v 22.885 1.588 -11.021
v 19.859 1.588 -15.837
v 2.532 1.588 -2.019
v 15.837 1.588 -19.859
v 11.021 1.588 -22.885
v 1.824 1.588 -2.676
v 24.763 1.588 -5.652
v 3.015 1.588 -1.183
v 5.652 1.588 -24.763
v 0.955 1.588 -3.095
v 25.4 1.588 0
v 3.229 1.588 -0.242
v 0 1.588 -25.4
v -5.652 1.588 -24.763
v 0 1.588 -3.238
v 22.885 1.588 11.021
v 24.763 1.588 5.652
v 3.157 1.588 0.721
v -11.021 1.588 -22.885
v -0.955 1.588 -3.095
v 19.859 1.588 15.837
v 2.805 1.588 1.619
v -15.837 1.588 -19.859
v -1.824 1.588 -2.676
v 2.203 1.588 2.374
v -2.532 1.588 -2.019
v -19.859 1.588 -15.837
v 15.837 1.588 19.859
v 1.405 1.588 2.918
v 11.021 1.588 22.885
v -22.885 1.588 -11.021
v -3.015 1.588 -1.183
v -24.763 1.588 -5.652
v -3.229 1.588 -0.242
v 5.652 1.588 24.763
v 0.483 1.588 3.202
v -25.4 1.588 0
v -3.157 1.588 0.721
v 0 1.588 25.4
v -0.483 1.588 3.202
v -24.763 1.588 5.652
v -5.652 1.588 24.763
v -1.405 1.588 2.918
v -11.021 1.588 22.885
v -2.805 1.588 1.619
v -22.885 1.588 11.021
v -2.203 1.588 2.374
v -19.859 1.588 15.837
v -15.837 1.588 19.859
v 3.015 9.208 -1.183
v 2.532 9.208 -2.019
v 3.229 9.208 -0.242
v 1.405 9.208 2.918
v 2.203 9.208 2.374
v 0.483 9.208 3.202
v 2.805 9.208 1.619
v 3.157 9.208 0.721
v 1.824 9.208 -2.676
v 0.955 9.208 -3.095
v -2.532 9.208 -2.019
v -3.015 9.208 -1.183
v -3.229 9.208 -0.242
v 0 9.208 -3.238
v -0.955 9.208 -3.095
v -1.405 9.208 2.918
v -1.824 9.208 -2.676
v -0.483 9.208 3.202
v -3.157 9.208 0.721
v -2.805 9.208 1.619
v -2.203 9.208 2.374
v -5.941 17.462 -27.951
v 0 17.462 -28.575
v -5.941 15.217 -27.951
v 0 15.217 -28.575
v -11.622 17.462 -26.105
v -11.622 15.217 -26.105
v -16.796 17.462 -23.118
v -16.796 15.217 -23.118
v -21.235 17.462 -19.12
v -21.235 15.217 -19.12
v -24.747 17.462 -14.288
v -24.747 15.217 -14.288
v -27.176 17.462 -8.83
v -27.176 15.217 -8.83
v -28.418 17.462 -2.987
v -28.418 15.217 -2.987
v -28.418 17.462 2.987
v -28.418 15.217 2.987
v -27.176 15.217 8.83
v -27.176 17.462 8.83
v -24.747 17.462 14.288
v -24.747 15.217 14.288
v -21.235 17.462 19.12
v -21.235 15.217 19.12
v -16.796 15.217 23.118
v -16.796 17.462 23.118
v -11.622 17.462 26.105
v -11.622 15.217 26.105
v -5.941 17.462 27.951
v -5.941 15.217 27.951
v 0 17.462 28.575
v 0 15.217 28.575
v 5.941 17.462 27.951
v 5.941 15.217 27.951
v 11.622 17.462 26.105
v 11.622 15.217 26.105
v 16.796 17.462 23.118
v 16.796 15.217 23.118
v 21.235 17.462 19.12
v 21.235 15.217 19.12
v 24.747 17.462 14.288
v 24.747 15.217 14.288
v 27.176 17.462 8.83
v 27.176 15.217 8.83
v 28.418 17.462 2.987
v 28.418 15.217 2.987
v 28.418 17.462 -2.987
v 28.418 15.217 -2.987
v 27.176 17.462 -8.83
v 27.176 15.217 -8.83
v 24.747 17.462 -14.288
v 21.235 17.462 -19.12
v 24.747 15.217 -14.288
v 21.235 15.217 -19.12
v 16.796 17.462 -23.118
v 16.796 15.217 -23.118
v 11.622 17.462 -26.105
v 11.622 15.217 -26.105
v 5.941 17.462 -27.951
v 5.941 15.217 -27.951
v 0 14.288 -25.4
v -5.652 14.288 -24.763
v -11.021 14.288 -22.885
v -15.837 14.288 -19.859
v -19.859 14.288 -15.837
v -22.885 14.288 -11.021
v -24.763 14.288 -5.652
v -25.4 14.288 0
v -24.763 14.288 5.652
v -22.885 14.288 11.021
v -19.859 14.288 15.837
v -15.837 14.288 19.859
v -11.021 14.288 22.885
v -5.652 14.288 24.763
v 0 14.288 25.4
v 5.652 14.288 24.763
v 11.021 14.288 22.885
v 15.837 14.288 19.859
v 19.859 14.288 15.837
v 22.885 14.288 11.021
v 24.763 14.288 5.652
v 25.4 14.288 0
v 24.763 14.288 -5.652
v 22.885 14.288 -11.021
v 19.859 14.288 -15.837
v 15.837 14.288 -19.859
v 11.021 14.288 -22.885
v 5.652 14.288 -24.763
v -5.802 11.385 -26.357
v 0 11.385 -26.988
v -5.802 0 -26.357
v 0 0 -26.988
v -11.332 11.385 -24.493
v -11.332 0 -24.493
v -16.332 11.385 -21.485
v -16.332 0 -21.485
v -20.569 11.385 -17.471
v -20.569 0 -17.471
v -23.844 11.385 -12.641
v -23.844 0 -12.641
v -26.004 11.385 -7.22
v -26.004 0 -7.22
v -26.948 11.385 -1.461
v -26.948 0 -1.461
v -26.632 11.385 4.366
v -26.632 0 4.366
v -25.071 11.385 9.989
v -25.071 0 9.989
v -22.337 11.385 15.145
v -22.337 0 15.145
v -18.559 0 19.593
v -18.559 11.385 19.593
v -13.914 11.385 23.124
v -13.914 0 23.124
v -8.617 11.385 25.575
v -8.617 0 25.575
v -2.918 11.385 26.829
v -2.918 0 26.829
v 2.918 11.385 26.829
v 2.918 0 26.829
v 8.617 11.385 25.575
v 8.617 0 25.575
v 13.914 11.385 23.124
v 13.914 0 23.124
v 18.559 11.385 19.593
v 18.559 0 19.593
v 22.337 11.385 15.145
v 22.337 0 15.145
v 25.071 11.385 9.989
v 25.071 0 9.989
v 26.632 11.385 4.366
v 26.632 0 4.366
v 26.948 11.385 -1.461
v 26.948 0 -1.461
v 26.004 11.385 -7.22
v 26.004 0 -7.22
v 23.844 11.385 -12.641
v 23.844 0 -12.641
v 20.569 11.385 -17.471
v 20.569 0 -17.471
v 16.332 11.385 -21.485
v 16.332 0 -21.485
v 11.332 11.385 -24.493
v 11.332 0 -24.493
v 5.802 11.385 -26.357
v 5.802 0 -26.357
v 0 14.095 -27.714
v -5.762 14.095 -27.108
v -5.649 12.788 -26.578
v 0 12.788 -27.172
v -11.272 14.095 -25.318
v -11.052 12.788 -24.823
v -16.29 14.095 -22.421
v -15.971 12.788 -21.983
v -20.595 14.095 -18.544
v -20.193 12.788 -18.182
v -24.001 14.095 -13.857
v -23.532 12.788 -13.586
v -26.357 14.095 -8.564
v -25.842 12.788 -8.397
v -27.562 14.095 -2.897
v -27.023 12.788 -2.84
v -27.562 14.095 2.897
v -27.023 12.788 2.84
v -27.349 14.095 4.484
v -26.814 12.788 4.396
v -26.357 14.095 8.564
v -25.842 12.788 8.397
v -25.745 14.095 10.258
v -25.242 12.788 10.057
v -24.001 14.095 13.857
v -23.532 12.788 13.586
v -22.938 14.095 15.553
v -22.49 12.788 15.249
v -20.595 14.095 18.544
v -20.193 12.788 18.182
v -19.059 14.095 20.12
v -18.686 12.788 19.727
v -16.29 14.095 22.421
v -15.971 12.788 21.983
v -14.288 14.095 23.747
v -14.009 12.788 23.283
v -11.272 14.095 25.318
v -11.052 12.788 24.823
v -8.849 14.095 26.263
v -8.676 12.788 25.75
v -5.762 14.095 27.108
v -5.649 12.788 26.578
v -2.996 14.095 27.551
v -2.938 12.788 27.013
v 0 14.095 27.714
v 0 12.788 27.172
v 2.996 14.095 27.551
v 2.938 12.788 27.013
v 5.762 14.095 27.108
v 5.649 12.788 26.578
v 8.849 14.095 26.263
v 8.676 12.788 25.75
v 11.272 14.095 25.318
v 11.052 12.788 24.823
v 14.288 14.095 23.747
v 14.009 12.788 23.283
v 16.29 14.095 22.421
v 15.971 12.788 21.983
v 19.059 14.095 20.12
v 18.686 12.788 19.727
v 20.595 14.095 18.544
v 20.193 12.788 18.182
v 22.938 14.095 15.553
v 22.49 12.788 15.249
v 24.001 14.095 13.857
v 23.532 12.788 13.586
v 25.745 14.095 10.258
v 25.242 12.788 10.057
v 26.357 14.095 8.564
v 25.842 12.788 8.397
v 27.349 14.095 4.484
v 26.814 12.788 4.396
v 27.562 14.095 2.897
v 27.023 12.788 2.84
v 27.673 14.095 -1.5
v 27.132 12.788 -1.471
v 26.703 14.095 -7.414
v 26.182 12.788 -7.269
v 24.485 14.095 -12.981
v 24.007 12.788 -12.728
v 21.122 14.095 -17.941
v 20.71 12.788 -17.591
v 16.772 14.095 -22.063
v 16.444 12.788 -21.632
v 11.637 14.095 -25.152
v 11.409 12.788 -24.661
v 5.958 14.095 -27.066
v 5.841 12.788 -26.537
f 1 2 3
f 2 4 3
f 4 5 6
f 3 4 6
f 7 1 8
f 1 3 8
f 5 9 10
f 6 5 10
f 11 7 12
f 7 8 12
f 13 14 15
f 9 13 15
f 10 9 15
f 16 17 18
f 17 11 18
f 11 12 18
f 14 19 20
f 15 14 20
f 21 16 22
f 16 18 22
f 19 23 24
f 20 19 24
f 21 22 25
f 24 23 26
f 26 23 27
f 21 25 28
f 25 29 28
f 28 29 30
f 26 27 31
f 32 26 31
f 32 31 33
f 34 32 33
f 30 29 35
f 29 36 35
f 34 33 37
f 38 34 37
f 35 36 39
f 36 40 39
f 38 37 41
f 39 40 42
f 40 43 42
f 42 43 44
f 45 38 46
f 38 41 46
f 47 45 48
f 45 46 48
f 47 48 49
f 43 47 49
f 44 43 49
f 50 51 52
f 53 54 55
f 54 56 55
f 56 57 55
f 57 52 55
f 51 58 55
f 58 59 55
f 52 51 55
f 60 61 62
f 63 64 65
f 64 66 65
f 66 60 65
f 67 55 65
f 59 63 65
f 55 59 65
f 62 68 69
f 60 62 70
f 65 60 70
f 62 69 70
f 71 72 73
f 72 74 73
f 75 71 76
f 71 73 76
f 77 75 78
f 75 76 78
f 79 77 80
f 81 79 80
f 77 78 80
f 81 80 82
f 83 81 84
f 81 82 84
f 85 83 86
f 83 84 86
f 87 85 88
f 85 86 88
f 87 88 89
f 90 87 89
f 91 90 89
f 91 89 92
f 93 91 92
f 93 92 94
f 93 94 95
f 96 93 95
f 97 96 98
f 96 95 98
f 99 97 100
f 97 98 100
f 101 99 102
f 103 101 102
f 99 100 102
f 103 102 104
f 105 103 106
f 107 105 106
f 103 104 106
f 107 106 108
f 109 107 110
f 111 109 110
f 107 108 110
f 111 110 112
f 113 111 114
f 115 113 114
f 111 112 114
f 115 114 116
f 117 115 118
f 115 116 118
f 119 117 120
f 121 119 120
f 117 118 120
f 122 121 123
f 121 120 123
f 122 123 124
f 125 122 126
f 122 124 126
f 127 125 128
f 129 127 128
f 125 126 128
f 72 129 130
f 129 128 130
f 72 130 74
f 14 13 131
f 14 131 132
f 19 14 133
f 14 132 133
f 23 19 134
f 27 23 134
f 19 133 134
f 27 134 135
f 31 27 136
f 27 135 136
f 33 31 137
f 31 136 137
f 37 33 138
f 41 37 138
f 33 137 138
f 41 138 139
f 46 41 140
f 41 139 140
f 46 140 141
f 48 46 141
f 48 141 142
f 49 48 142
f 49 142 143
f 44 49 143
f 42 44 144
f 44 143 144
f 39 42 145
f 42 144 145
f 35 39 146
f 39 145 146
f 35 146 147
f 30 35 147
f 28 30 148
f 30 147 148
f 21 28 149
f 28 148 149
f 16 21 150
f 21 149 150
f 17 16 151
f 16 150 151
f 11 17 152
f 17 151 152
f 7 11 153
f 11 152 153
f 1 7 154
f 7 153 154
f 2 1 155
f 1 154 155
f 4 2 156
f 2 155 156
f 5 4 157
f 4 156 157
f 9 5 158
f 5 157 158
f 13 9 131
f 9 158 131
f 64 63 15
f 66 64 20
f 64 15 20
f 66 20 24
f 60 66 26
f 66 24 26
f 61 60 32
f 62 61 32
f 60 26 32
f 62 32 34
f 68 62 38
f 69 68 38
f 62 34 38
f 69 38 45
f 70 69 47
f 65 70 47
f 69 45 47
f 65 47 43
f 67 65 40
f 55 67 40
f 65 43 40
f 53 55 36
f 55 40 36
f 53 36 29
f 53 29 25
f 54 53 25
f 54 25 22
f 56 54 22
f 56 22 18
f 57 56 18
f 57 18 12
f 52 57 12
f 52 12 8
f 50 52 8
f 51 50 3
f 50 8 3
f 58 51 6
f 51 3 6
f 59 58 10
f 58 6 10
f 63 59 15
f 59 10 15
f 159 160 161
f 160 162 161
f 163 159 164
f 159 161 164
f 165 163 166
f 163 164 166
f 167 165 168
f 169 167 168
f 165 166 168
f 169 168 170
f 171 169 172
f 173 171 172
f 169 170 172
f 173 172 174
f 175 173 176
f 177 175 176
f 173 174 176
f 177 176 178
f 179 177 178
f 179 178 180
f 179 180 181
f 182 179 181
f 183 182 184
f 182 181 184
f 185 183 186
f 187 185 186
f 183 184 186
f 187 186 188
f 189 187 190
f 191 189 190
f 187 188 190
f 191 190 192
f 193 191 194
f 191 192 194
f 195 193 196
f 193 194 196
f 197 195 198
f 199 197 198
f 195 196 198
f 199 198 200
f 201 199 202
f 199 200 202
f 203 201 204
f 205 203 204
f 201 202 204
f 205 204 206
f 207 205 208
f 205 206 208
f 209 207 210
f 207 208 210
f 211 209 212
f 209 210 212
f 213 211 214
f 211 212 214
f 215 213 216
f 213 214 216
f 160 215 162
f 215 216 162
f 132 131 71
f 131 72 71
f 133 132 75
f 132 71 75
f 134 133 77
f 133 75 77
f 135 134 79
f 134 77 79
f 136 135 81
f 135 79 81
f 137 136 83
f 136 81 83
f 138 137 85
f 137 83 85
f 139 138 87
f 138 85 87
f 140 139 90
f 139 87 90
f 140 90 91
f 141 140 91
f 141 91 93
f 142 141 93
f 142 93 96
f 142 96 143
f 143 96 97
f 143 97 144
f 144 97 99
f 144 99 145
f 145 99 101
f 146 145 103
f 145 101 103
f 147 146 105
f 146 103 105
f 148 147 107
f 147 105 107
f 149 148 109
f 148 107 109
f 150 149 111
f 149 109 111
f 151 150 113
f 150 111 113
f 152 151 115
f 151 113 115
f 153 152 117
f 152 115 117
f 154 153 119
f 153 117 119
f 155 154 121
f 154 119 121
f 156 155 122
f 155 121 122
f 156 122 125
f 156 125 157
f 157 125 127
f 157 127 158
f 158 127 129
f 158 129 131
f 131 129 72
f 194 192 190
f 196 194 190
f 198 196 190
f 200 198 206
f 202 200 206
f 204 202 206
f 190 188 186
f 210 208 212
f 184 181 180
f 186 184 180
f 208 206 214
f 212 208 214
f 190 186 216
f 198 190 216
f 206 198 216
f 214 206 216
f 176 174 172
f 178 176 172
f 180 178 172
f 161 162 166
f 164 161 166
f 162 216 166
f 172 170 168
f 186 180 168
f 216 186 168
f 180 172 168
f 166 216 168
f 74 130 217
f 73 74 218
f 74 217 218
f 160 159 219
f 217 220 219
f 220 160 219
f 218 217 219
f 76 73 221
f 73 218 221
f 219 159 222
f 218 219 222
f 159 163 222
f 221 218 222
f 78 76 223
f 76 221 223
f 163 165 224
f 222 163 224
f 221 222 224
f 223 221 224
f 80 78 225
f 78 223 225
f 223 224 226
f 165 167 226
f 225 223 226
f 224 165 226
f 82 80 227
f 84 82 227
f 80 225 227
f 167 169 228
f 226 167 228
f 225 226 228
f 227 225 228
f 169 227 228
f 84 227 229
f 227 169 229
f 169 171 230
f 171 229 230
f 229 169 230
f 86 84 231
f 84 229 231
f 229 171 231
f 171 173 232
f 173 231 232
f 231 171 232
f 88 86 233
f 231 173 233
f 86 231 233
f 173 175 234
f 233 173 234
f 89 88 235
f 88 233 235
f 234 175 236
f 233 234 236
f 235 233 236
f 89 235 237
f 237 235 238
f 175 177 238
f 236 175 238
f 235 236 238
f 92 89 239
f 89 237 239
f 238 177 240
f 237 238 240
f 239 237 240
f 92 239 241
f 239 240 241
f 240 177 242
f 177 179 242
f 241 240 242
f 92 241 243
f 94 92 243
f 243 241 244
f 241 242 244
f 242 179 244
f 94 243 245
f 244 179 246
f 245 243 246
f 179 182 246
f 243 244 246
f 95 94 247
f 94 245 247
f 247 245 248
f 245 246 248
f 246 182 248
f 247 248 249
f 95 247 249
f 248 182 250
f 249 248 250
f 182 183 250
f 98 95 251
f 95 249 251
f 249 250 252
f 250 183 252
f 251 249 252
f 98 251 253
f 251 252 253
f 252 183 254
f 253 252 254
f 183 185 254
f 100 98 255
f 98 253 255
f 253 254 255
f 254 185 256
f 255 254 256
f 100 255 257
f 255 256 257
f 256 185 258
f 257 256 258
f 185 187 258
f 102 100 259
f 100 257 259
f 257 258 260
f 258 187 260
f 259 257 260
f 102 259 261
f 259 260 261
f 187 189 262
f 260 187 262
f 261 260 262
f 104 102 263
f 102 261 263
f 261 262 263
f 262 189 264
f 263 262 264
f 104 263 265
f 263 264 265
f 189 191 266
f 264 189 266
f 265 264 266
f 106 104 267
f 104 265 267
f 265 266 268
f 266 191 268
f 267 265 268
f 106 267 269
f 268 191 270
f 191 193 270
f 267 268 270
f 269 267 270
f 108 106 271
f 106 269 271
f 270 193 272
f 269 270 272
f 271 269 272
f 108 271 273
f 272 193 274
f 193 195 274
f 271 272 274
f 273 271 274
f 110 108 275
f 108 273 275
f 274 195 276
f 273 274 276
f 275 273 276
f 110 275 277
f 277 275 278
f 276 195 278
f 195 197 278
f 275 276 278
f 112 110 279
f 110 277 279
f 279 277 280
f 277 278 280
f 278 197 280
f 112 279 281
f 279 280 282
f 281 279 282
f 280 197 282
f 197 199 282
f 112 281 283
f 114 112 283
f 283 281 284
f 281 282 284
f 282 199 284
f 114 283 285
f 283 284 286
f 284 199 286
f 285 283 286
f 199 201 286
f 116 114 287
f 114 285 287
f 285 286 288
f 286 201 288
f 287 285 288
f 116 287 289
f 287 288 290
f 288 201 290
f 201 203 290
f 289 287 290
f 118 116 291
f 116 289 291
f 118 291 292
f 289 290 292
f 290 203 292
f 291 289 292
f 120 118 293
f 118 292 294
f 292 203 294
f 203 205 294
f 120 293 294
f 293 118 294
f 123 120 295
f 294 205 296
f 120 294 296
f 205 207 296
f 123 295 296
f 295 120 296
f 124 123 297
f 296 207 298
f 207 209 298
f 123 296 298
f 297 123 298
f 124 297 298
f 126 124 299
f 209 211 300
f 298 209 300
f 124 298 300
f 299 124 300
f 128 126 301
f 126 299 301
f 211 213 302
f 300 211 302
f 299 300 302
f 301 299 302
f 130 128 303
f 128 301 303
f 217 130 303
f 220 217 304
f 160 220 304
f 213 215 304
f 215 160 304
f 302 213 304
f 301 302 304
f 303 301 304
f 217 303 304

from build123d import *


with BuildPart() as part:
    # Sketch2 → Revolve1 (revolve)
    with BuildSketch(Plane(origin=(0, 0, 0), x_dir=(0, 0, -1), z_dir=(1, 0, 0))):
        with BuildLine():
            Line((0, 0), (0, 9.2075))
            Line((0, 9.2075), (3.2385, 9.2075))
            Line((3.2385, 9.2075), (3.2385, 1.5875))
            Line((3.2385, 1.5875), (25.4, 1.5875))
            Line((25.4, 1.5875), (25.4, 14.2875))
            Line((25.4, 14.2875), (28.575, 17.4625))
            Line((28.575, 17.4625), (28.575, 15.21743597))
            ThreePointArc((28.575, 15.21743597), (27.400077808, 13.459040646), (26.9875, 11.384871939))
            Line((26.9875, 11.384871939), (26.9875, 0))
            Line((26.9875, 0), (0, 0))
        make_face()
    revolve(axis=Axis((0, 0, 0), (0, 1, 0)))


solid = part.part
